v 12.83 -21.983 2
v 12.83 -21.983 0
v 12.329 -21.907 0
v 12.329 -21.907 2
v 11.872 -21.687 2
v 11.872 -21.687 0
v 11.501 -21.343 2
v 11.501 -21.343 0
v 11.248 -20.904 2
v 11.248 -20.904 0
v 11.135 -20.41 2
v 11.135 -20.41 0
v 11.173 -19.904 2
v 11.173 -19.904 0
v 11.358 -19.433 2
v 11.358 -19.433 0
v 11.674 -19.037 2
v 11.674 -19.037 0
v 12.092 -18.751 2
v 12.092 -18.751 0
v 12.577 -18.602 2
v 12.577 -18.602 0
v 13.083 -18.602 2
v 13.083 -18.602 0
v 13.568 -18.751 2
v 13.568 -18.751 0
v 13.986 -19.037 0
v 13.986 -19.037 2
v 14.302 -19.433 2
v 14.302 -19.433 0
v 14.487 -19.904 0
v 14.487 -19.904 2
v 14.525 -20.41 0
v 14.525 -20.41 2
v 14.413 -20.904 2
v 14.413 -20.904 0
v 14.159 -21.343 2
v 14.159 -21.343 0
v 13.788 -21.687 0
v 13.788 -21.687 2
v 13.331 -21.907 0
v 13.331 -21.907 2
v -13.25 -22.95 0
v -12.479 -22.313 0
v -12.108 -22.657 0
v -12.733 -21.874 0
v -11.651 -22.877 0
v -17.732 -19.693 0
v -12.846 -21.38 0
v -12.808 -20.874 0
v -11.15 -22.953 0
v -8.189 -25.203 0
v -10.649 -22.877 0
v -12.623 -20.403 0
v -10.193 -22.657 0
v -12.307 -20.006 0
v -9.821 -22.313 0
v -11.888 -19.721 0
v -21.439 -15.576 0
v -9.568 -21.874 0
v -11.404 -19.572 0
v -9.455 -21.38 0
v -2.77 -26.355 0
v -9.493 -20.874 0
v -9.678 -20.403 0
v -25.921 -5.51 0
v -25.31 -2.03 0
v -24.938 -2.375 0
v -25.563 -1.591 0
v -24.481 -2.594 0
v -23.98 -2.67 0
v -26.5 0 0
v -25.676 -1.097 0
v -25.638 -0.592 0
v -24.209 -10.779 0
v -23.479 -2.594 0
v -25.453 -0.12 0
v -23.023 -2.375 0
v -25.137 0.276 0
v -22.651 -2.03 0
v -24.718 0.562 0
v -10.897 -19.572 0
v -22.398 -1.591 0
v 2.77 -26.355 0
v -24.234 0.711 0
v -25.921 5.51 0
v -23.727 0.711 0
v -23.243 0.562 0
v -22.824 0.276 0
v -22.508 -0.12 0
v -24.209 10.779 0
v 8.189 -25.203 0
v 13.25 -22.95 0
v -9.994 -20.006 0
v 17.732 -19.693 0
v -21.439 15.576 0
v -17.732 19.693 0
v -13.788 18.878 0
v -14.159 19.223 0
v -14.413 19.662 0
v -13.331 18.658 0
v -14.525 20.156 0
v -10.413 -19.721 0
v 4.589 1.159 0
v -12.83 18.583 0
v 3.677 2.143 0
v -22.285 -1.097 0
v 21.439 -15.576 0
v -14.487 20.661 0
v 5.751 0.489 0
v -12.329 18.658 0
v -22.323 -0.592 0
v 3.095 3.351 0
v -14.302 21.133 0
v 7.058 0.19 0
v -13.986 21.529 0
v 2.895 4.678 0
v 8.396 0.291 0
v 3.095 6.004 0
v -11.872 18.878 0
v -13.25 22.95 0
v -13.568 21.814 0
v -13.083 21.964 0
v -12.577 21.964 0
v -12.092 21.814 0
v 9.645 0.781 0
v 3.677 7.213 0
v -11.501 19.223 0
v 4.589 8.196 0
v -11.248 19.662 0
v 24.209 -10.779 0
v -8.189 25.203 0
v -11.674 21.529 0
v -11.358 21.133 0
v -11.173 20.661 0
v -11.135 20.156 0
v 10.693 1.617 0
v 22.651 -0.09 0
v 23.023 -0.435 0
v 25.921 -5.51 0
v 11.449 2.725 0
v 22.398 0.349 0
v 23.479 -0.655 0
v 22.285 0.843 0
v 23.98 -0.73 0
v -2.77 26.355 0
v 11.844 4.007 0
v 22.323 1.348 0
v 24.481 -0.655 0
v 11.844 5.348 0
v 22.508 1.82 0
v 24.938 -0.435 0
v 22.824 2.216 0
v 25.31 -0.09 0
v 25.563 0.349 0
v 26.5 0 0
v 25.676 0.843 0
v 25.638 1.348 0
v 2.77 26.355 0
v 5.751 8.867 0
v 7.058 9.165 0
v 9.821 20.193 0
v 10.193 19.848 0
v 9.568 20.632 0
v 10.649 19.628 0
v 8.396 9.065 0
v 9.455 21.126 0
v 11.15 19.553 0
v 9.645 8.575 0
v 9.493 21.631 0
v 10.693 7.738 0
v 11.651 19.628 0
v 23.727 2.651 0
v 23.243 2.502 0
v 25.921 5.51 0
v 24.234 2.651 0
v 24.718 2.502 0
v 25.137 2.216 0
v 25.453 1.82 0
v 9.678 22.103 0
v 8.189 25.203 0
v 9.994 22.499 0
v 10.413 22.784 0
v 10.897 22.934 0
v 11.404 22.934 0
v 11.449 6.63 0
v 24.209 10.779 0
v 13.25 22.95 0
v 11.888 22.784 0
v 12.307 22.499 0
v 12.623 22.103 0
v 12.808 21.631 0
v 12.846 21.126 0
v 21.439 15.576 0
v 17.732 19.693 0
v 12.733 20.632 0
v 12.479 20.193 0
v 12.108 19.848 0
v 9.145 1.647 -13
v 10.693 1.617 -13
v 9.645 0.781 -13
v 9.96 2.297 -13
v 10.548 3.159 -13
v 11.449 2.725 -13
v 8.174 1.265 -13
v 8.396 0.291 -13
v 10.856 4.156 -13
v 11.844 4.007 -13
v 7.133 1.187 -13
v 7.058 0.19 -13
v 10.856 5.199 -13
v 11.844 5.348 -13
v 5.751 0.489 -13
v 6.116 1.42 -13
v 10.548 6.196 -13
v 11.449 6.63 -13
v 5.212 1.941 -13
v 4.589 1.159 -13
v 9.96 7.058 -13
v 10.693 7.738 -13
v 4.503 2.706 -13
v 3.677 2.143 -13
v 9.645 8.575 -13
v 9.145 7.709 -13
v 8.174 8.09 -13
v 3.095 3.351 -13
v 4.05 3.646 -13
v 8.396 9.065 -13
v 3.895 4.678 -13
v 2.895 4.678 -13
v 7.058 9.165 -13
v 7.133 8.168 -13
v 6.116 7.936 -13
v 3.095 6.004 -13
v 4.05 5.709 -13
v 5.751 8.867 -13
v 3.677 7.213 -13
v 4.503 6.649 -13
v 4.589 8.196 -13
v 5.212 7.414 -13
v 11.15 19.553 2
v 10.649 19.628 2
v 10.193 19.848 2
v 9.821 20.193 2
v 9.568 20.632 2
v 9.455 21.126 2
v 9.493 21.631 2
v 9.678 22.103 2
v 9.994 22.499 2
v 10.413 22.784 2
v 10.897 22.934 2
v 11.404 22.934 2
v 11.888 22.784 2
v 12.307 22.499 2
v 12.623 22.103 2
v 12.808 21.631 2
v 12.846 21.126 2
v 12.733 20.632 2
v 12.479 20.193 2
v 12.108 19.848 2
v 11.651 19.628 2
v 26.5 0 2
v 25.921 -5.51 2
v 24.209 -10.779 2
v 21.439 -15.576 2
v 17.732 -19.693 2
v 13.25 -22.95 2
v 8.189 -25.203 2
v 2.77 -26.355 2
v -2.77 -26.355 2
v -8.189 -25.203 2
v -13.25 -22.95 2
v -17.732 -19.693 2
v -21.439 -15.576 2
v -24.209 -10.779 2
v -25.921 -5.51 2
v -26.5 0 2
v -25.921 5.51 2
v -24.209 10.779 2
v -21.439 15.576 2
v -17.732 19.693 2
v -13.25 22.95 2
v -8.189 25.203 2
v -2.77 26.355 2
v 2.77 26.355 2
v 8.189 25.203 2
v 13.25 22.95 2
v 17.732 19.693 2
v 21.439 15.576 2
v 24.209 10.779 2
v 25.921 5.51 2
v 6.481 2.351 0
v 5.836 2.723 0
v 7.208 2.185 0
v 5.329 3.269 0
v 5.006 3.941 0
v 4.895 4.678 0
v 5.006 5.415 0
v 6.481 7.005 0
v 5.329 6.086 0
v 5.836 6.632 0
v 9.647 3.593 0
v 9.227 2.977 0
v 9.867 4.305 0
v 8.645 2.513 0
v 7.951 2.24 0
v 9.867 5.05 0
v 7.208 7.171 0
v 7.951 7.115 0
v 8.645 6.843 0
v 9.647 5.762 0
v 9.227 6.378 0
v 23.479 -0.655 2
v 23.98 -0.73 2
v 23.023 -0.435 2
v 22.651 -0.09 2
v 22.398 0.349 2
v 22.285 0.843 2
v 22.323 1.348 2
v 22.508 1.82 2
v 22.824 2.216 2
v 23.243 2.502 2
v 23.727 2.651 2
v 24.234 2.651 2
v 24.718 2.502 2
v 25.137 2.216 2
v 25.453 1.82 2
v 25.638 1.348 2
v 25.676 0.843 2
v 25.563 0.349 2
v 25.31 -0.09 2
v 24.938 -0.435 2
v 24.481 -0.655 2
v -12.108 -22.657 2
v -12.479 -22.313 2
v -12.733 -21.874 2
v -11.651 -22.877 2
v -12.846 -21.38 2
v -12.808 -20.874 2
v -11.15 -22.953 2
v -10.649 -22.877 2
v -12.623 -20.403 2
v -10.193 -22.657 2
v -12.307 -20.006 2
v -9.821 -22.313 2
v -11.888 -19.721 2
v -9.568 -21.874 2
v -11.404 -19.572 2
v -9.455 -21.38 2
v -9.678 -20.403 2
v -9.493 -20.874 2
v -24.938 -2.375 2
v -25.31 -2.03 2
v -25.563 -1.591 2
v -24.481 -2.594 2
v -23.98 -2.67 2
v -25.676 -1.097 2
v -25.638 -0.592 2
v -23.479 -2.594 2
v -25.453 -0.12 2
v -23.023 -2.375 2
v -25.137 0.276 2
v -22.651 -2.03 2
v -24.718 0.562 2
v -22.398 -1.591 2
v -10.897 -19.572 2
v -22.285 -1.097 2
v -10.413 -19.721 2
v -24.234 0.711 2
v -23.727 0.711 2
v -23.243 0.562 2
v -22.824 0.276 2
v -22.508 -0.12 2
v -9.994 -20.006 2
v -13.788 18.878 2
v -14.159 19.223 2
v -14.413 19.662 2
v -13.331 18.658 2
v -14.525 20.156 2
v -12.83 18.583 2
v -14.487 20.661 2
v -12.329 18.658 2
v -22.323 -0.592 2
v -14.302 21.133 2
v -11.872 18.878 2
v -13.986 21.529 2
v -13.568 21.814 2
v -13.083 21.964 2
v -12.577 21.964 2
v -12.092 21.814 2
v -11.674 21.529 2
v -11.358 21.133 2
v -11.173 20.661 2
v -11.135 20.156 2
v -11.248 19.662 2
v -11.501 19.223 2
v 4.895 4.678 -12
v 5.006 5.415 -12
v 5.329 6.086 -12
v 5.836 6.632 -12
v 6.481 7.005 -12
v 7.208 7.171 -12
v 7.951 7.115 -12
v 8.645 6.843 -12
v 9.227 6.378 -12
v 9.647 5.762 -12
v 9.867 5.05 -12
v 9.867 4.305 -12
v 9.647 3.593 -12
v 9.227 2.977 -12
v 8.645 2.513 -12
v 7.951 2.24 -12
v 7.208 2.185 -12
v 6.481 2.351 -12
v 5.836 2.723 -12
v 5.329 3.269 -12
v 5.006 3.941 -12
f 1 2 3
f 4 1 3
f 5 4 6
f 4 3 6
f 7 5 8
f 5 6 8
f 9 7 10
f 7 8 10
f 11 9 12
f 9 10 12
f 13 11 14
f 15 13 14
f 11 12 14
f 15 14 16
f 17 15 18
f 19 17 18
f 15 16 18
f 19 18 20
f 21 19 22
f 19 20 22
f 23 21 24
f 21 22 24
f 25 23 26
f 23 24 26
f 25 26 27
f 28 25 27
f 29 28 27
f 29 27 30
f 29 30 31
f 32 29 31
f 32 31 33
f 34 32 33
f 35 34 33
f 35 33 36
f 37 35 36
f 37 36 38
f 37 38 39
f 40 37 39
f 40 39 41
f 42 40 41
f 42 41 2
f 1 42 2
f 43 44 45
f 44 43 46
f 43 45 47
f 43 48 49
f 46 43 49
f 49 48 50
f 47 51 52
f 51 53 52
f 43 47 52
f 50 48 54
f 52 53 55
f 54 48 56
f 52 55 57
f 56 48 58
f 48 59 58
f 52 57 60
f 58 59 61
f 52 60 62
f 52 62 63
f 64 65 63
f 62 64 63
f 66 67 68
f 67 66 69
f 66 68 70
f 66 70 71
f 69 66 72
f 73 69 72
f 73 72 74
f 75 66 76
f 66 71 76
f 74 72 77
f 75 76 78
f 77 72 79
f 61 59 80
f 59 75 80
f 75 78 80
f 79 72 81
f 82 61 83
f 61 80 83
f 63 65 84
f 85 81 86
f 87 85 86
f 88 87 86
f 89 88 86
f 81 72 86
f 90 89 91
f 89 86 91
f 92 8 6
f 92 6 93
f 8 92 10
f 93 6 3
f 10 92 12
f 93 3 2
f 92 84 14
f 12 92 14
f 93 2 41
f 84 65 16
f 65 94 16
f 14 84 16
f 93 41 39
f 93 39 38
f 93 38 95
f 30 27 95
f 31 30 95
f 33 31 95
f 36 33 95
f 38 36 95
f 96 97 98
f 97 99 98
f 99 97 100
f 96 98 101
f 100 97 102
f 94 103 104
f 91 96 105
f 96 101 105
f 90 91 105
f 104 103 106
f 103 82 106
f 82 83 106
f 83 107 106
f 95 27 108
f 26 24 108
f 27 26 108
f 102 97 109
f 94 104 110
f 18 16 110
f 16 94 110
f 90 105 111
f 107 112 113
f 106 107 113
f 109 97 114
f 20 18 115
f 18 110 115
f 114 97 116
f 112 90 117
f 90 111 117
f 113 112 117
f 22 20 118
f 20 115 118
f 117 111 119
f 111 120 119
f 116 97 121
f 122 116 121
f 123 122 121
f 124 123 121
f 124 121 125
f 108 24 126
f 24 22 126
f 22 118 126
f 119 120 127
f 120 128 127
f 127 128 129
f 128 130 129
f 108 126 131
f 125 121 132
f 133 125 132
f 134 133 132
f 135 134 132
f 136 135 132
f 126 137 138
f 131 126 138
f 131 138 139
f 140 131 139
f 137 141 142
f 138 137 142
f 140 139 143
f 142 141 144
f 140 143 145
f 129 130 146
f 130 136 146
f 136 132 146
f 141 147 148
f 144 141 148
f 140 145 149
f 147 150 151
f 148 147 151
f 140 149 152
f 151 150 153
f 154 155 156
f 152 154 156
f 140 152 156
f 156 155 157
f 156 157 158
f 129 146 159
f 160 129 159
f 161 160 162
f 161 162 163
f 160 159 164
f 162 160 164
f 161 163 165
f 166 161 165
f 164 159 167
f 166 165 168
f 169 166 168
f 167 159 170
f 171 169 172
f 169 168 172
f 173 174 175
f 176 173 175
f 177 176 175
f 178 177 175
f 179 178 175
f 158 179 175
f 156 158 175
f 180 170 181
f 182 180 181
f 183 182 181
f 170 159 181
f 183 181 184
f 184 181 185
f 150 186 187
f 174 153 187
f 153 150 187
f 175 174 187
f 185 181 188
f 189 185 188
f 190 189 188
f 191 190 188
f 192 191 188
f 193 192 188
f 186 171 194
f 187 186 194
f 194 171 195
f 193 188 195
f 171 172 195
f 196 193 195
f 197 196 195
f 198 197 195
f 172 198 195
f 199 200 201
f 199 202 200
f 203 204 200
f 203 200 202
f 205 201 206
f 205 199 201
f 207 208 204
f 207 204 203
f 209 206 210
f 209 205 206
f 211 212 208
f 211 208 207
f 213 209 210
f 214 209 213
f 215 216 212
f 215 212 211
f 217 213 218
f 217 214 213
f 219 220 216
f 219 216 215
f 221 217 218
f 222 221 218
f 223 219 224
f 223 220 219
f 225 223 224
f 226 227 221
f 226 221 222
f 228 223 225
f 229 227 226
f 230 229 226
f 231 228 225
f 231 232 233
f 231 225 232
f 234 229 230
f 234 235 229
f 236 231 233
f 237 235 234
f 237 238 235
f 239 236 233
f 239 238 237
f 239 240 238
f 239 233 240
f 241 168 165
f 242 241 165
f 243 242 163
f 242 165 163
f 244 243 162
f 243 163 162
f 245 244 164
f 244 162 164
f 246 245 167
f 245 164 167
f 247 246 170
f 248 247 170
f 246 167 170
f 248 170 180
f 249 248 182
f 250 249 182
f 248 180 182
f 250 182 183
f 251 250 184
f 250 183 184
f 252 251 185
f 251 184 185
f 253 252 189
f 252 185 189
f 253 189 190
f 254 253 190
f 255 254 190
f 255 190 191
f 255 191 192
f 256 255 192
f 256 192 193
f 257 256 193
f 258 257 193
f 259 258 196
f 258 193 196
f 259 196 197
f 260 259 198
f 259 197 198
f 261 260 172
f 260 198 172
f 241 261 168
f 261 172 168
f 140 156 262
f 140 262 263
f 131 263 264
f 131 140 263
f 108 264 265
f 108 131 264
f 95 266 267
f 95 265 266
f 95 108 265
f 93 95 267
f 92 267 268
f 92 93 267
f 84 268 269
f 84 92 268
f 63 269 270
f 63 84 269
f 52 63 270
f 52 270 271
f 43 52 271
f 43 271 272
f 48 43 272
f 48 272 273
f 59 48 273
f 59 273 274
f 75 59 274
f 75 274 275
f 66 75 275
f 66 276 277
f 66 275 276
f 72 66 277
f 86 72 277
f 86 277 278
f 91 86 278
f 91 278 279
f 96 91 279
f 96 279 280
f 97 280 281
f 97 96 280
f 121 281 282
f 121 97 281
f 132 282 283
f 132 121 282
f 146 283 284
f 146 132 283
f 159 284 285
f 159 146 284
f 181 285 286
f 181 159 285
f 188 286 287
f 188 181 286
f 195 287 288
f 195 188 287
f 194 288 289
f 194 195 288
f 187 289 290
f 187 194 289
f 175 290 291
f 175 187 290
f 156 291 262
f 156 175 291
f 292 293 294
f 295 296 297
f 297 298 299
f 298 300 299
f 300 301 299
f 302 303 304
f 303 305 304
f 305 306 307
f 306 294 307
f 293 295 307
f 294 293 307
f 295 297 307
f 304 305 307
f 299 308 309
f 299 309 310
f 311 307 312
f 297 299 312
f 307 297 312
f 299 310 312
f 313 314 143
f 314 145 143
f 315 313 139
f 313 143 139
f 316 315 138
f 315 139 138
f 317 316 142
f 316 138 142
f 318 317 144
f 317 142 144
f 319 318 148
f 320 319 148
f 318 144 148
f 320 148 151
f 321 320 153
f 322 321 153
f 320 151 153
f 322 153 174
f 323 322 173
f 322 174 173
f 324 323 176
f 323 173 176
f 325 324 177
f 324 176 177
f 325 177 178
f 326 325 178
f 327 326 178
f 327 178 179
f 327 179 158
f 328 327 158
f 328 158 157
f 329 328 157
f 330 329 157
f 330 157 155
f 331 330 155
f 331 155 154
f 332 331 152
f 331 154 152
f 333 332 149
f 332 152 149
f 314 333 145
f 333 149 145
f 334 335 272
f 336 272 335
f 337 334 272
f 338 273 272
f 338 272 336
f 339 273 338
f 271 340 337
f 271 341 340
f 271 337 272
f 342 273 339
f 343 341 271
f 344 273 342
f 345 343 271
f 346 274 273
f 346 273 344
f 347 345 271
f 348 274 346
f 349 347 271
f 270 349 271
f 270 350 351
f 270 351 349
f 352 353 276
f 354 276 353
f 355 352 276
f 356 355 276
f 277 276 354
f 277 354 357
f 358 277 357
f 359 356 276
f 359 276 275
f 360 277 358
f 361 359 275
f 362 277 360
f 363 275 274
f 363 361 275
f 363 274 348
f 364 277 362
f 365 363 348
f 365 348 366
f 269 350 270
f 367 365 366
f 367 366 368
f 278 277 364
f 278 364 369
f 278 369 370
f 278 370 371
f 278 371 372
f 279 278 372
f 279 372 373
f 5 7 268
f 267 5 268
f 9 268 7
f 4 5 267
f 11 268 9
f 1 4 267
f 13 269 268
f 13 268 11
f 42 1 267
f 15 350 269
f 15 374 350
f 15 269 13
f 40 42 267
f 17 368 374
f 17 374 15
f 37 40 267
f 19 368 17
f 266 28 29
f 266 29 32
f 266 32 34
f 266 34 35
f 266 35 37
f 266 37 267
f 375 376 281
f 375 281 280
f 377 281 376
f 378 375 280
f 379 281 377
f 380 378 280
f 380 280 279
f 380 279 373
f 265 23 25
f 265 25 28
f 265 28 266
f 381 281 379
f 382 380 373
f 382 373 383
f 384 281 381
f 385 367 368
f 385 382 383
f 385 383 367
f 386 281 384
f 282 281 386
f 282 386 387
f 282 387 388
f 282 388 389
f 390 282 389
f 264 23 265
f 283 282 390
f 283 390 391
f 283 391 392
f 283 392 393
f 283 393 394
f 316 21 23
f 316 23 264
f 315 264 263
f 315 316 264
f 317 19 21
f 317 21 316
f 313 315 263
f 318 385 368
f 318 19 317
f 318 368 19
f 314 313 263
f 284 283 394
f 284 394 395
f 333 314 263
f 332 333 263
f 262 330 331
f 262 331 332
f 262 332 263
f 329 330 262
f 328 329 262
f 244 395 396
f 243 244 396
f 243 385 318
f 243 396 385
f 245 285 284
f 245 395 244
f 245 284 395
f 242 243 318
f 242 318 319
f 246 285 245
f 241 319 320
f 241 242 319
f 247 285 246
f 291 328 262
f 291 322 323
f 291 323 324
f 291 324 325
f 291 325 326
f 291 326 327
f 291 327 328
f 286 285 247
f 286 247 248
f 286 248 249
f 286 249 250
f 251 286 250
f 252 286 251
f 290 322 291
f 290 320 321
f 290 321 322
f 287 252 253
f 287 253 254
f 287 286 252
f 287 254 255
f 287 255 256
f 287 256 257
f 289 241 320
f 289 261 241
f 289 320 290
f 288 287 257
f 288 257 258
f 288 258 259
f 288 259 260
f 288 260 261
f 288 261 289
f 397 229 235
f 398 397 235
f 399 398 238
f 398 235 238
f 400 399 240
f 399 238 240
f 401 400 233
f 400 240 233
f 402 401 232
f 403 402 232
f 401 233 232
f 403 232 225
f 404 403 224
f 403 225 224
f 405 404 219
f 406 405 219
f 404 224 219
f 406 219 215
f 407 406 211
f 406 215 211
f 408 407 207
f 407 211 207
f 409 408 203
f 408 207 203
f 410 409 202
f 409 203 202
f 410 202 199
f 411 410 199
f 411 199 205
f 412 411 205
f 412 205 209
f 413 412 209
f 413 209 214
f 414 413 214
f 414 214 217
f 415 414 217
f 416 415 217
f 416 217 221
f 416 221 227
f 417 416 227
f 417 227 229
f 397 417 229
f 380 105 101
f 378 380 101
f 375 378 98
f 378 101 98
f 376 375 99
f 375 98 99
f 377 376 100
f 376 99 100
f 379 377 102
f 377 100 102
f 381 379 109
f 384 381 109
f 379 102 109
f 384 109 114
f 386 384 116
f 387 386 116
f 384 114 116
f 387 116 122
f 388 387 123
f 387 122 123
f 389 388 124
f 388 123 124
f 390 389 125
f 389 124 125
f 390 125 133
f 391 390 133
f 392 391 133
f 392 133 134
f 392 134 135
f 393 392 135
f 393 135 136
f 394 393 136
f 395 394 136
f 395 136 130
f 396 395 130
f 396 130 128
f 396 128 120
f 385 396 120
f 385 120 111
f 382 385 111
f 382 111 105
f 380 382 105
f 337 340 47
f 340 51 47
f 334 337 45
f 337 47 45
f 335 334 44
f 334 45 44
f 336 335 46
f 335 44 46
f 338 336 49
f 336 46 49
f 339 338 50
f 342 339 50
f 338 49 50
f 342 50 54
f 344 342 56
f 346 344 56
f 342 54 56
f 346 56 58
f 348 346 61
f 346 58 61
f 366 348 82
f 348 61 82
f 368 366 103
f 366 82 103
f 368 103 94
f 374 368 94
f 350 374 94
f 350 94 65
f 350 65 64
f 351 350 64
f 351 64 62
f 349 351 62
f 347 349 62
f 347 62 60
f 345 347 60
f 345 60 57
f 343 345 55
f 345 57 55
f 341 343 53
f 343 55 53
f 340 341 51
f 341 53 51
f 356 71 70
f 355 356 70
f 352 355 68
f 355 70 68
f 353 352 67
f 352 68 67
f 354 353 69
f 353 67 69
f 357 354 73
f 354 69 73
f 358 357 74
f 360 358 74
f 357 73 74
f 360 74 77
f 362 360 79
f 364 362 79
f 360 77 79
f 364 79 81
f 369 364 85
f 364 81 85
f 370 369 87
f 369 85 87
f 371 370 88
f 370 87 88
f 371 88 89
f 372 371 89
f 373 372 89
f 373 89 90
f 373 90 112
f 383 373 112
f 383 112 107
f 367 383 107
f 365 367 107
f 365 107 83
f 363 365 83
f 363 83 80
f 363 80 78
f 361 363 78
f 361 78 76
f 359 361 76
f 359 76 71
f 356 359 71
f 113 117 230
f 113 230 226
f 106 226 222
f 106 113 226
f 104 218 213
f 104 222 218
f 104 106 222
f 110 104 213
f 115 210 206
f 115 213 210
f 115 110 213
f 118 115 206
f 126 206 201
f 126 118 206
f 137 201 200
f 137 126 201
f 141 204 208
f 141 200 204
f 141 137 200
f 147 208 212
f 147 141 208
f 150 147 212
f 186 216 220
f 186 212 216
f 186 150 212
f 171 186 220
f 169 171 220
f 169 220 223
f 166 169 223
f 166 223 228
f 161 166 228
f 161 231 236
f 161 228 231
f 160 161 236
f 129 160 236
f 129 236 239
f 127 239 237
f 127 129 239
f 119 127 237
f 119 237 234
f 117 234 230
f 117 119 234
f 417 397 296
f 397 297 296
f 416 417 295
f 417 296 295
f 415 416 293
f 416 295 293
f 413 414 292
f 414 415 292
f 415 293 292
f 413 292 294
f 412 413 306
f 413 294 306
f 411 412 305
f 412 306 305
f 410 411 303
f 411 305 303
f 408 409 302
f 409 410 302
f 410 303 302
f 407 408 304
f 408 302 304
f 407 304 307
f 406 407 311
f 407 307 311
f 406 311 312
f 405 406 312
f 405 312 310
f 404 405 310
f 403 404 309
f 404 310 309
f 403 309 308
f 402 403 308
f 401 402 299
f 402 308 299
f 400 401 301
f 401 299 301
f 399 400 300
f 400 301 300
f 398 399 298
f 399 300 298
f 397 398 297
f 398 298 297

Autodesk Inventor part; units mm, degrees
ref_plane "YZ Plane" through (0, 0, 0) normal (1, 0, 0) x (0, 1, 0)
ref_plane "XZ Plane" through (0, 0, 0) normal (0, 1, 0) x (-1, 0, 0)
ref_plane "XY Plane" through (0, 0, 0) normal (0, 0, 1) x (1, 0, 0)
sketch "Sketch2" plane through (0, 0, 0) normal (0, 0, 1) x (1, 0, 0)
  circle A0 centre (0, 0) radius 26.5
  dimension "d0" = 53
extrude "Extrusion1" add sketch "Sketch2" along normal blind 2
sketch "Sketch3" plane through (0, 0, 2) normal (0, 0, 1) x (1, 0, 0)
  circle A0 centre (-12.8301, 20.2827) radius 1.2295 construction
  circle A1 centre (-11.1503, -21.2526) radius 1.2295 construction
  circle A2 centre (23.9804, 0.9699) radius 1.2295 construction
  circle A3 centre (12.8301, -20.2827) radius 1.2295 construction
  circle A4 centre (-23.9804, -0.9699) radius 1.2295 construction
  circle A5 centre (11.1503, 21.2526) radius 1.2295 construction
  circle A6 centre (0, 0) radius 26.5 construction
  circle A7 centre (0, 0) radius 21.5 projected
  point P0 (0, 0)
hole "Hole1" at (23.9804, 0.9699, 2) at (12.8301, -20.2827, 2) at (-11.1503, -21.2526, 2) at (-23.9804, -0.9699, 2) at (-12.8301, 20.2827, 2) at (11.1503, 21.2526, 2) direction (0, 0, -1) diameter 3.4 end through all clearance for "Countersunk Flat Head Screw ISO 2009/7046" size "M3" standard "ISO"
sketch "Sketch4" plane through (0, 0, 0) normal (0, 0, -1) x (-1, 0, 0)
  circle A0 centre (-7.3947, 4.6777) radius 2.5
  circle A1 centre (-7.3947, 4.6777) radius 4.5
  circle A2 centre (-7.3947, 4.6777) radius 6 construction
  point P0 (0, 0)
  dimension "d10" = 5
  dimension "d11" = 2
extrude "Extrusion2" add sketch "Sketch4" along normal blind 13
chamfer "Chamfer1" distance 1 angle 45 1 edges at (9.8947, 4.6777, -13)
properties part number "P019" material "Aluminium"
